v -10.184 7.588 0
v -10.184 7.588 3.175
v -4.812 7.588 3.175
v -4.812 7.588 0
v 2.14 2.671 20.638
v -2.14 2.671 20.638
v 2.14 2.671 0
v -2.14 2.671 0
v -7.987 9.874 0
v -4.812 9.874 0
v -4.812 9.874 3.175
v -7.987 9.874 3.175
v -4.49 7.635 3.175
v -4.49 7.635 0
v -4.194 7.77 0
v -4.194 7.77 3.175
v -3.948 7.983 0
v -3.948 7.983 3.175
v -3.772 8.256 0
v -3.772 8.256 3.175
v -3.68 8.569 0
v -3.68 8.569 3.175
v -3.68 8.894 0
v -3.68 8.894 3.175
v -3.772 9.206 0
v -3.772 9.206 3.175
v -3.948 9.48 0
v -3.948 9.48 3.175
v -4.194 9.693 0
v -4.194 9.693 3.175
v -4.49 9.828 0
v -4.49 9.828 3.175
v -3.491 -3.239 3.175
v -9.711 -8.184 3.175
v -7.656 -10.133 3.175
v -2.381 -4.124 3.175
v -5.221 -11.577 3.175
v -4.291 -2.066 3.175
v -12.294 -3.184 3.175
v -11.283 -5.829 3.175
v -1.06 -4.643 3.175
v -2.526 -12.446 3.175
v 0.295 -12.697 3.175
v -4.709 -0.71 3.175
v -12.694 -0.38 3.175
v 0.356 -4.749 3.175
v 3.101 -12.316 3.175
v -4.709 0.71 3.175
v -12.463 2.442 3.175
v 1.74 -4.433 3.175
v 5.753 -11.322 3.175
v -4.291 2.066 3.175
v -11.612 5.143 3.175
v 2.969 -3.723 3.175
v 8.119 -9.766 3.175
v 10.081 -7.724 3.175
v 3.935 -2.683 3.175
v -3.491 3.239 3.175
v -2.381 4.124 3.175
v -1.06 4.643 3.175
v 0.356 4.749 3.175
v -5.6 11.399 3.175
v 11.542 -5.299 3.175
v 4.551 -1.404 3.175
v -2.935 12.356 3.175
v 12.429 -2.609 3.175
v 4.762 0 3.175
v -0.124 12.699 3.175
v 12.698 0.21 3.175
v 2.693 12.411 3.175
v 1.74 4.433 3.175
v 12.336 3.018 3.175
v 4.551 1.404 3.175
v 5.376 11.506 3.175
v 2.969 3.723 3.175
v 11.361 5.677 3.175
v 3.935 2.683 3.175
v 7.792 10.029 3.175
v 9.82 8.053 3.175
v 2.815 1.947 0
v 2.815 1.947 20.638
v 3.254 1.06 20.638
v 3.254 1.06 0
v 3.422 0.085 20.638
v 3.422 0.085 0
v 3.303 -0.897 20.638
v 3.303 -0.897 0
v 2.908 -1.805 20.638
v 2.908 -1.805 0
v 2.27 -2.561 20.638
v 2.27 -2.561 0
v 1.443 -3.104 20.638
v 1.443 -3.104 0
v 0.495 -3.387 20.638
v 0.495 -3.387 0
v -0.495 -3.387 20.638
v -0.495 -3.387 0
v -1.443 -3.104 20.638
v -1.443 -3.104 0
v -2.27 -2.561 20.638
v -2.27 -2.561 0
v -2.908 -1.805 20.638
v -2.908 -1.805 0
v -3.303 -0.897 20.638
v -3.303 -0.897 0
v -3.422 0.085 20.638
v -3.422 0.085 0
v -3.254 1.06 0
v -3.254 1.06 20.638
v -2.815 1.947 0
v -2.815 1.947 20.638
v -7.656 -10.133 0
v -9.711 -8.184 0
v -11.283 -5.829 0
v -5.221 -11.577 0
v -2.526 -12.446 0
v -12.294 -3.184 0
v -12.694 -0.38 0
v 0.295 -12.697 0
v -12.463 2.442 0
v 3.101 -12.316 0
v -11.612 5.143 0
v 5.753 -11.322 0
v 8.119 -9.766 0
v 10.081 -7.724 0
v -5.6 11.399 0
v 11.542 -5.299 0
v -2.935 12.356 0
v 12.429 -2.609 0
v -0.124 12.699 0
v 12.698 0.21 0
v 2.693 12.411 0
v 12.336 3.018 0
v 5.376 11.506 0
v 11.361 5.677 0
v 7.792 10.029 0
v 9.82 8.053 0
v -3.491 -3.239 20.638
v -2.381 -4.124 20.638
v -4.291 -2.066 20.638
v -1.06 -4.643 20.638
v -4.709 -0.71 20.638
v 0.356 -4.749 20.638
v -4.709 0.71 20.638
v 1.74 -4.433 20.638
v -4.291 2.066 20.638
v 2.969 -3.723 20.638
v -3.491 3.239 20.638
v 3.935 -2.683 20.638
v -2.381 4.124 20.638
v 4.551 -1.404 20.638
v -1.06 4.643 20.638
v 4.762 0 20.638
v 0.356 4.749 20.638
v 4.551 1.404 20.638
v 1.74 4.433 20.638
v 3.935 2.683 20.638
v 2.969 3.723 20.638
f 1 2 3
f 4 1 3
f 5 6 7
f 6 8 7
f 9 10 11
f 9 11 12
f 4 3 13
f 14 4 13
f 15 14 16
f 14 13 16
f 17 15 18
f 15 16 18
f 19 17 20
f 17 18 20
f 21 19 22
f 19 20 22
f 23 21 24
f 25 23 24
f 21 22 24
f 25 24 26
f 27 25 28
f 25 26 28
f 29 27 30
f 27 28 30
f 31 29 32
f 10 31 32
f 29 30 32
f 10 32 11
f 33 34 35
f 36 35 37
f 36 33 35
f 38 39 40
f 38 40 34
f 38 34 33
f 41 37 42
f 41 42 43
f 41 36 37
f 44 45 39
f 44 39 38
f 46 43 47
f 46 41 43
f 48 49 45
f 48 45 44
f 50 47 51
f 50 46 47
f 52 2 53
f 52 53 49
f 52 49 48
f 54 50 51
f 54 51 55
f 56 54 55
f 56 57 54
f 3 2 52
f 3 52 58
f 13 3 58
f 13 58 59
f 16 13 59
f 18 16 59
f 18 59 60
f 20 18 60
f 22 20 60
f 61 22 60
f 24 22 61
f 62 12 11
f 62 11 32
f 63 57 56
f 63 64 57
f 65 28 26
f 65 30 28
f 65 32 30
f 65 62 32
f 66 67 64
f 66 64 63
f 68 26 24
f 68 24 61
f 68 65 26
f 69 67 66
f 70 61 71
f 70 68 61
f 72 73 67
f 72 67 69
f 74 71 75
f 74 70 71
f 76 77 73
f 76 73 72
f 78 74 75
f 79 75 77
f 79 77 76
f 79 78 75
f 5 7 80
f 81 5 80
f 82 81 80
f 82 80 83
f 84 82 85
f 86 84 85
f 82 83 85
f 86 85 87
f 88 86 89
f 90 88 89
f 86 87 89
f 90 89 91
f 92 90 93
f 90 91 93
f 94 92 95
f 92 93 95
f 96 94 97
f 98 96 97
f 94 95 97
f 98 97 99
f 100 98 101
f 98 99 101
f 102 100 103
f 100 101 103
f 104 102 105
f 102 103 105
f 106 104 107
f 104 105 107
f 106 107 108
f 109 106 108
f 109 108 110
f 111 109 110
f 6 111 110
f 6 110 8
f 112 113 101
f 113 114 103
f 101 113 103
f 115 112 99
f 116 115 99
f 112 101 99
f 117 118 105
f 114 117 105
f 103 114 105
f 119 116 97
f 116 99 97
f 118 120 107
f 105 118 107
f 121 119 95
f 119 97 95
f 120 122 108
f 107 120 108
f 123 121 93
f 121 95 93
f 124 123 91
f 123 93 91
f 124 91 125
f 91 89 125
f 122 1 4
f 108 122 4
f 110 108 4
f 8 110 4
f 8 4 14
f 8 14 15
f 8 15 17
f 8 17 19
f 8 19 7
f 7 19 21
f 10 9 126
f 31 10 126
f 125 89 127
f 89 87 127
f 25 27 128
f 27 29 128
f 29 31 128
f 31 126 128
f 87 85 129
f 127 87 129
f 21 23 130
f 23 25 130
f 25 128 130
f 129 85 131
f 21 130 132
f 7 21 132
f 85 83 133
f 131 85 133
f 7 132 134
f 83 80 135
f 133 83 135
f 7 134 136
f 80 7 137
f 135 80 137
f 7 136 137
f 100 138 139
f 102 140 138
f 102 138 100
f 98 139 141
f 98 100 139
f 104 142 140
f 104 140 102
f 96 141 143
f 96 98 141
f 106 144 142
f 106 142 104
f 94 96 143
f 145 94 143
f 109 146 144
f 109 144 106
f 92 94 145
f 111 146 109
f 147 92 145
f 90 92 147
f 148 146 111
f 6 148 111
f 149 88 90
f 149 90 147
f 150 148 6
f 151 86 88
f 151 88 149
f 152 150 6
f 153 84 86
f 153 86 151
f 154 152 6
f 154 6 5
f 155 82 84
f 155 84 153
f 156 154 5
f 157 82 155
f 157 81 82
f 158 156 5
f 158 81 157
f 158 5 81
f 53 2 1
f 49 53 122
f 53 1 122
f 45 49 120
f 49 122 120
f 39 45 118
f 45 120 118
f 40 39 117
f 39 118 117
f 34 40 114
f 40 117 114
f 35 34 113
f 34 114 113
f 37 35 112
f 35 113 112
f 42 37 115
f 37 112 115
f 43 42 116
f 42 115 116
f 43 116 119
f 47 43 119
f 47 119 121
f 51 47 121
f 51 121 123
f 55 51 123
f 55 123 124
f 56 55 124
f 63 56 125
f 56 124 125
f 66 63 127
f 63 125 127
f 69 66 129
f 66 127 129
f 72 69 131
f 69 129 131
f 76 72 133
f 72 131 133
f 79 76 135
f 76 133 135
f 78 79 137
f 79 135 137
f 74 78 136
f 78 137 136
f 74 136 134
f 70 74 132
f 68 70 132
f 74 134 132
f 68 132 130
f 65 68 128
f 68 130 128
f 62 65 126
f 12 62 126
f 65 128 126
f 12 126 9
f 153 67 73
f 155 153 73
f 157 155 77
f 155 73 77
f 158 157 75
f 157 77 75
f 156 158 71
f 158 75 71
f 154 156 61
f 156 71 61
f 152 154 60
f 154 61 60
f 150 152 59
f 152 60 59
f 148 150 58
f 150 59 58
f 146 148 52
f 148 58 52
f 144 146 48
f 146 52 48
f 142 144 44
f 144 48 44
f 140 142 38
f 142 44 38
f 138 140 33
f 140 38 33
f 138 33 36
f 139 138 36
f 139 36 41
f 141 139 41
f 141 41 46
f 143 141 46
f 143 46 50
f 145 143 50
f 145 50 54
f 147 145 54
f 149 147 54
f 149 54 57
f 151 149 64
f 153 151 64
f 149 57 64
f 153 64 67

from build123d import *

# Parameters (mm, degrees)
F0_R     = 12.7
F1_DEPTH = 3.175
F2_R     = 4.7625
F3_DEPTH = 17.4625
F4_DEPTH = 25.4


# Not quite as in the source:
# - a length typed as a fraction of an inch, garbled in the dataset ("3 / 203.2 mm" for 3/8 in), is restored


with BuildPart() as f1:
    # F0 (on Top) → F1 (new body)
    with BuildSketch(Plane.XY):
        Circle(F0_R)
        with BuildLine():
            ThreePointArc((2.1403987868, 2.67081), (0, -3.42265), (-2.1403987868, 2.67081))
            Line((-2.1403987868, 2.67081), (2.1403987868, 2.67081))
        make_face(mode=Mode.SUBTRACT)
    extrude(amount=F1_DEPTH)

    # F2 (on face) → F3 (join)
    with BuildSketch(Plane.XY.offset(3.175)):
        Circle(F2_R)
        with BuildLine():
            Line((-2.1403987868, 2.67081), (2.1403987868, 2.67081))
            ThreePointArc((2.1403987868, 2.67081), (0, -3.42265), (-2.1403987868, 2.67081))
        make_face(mode=Mode.SUBTRACT)
    extrude(amount=F3_DEPTH)

    # F2 (on face) → F4 (cut)
    with BuildSketch(Plane.XY.offset(3.175)):
        with BuildLine():
            ThreePointArc((-4.8118133156, 7.58825), (-3.6688133156, 8.73125), (-4.8118133156, 9.87425))
            Line((-4.8118133156, 9.87425), (-7.9868133156, 9.87425))
            ThreePointArc((-7.9868133156, 9.87425), (-9.1568912319, 8.8000763046), (-10.1837351663, 7.58825))
            Line((-10.1837351663, 7.58825), (-4.8118133156, 7.58825))
        make_face()
    extrude(amount=-F4_DEPTH, mode=Mode.SUBTRACT)


solid = f1.part
